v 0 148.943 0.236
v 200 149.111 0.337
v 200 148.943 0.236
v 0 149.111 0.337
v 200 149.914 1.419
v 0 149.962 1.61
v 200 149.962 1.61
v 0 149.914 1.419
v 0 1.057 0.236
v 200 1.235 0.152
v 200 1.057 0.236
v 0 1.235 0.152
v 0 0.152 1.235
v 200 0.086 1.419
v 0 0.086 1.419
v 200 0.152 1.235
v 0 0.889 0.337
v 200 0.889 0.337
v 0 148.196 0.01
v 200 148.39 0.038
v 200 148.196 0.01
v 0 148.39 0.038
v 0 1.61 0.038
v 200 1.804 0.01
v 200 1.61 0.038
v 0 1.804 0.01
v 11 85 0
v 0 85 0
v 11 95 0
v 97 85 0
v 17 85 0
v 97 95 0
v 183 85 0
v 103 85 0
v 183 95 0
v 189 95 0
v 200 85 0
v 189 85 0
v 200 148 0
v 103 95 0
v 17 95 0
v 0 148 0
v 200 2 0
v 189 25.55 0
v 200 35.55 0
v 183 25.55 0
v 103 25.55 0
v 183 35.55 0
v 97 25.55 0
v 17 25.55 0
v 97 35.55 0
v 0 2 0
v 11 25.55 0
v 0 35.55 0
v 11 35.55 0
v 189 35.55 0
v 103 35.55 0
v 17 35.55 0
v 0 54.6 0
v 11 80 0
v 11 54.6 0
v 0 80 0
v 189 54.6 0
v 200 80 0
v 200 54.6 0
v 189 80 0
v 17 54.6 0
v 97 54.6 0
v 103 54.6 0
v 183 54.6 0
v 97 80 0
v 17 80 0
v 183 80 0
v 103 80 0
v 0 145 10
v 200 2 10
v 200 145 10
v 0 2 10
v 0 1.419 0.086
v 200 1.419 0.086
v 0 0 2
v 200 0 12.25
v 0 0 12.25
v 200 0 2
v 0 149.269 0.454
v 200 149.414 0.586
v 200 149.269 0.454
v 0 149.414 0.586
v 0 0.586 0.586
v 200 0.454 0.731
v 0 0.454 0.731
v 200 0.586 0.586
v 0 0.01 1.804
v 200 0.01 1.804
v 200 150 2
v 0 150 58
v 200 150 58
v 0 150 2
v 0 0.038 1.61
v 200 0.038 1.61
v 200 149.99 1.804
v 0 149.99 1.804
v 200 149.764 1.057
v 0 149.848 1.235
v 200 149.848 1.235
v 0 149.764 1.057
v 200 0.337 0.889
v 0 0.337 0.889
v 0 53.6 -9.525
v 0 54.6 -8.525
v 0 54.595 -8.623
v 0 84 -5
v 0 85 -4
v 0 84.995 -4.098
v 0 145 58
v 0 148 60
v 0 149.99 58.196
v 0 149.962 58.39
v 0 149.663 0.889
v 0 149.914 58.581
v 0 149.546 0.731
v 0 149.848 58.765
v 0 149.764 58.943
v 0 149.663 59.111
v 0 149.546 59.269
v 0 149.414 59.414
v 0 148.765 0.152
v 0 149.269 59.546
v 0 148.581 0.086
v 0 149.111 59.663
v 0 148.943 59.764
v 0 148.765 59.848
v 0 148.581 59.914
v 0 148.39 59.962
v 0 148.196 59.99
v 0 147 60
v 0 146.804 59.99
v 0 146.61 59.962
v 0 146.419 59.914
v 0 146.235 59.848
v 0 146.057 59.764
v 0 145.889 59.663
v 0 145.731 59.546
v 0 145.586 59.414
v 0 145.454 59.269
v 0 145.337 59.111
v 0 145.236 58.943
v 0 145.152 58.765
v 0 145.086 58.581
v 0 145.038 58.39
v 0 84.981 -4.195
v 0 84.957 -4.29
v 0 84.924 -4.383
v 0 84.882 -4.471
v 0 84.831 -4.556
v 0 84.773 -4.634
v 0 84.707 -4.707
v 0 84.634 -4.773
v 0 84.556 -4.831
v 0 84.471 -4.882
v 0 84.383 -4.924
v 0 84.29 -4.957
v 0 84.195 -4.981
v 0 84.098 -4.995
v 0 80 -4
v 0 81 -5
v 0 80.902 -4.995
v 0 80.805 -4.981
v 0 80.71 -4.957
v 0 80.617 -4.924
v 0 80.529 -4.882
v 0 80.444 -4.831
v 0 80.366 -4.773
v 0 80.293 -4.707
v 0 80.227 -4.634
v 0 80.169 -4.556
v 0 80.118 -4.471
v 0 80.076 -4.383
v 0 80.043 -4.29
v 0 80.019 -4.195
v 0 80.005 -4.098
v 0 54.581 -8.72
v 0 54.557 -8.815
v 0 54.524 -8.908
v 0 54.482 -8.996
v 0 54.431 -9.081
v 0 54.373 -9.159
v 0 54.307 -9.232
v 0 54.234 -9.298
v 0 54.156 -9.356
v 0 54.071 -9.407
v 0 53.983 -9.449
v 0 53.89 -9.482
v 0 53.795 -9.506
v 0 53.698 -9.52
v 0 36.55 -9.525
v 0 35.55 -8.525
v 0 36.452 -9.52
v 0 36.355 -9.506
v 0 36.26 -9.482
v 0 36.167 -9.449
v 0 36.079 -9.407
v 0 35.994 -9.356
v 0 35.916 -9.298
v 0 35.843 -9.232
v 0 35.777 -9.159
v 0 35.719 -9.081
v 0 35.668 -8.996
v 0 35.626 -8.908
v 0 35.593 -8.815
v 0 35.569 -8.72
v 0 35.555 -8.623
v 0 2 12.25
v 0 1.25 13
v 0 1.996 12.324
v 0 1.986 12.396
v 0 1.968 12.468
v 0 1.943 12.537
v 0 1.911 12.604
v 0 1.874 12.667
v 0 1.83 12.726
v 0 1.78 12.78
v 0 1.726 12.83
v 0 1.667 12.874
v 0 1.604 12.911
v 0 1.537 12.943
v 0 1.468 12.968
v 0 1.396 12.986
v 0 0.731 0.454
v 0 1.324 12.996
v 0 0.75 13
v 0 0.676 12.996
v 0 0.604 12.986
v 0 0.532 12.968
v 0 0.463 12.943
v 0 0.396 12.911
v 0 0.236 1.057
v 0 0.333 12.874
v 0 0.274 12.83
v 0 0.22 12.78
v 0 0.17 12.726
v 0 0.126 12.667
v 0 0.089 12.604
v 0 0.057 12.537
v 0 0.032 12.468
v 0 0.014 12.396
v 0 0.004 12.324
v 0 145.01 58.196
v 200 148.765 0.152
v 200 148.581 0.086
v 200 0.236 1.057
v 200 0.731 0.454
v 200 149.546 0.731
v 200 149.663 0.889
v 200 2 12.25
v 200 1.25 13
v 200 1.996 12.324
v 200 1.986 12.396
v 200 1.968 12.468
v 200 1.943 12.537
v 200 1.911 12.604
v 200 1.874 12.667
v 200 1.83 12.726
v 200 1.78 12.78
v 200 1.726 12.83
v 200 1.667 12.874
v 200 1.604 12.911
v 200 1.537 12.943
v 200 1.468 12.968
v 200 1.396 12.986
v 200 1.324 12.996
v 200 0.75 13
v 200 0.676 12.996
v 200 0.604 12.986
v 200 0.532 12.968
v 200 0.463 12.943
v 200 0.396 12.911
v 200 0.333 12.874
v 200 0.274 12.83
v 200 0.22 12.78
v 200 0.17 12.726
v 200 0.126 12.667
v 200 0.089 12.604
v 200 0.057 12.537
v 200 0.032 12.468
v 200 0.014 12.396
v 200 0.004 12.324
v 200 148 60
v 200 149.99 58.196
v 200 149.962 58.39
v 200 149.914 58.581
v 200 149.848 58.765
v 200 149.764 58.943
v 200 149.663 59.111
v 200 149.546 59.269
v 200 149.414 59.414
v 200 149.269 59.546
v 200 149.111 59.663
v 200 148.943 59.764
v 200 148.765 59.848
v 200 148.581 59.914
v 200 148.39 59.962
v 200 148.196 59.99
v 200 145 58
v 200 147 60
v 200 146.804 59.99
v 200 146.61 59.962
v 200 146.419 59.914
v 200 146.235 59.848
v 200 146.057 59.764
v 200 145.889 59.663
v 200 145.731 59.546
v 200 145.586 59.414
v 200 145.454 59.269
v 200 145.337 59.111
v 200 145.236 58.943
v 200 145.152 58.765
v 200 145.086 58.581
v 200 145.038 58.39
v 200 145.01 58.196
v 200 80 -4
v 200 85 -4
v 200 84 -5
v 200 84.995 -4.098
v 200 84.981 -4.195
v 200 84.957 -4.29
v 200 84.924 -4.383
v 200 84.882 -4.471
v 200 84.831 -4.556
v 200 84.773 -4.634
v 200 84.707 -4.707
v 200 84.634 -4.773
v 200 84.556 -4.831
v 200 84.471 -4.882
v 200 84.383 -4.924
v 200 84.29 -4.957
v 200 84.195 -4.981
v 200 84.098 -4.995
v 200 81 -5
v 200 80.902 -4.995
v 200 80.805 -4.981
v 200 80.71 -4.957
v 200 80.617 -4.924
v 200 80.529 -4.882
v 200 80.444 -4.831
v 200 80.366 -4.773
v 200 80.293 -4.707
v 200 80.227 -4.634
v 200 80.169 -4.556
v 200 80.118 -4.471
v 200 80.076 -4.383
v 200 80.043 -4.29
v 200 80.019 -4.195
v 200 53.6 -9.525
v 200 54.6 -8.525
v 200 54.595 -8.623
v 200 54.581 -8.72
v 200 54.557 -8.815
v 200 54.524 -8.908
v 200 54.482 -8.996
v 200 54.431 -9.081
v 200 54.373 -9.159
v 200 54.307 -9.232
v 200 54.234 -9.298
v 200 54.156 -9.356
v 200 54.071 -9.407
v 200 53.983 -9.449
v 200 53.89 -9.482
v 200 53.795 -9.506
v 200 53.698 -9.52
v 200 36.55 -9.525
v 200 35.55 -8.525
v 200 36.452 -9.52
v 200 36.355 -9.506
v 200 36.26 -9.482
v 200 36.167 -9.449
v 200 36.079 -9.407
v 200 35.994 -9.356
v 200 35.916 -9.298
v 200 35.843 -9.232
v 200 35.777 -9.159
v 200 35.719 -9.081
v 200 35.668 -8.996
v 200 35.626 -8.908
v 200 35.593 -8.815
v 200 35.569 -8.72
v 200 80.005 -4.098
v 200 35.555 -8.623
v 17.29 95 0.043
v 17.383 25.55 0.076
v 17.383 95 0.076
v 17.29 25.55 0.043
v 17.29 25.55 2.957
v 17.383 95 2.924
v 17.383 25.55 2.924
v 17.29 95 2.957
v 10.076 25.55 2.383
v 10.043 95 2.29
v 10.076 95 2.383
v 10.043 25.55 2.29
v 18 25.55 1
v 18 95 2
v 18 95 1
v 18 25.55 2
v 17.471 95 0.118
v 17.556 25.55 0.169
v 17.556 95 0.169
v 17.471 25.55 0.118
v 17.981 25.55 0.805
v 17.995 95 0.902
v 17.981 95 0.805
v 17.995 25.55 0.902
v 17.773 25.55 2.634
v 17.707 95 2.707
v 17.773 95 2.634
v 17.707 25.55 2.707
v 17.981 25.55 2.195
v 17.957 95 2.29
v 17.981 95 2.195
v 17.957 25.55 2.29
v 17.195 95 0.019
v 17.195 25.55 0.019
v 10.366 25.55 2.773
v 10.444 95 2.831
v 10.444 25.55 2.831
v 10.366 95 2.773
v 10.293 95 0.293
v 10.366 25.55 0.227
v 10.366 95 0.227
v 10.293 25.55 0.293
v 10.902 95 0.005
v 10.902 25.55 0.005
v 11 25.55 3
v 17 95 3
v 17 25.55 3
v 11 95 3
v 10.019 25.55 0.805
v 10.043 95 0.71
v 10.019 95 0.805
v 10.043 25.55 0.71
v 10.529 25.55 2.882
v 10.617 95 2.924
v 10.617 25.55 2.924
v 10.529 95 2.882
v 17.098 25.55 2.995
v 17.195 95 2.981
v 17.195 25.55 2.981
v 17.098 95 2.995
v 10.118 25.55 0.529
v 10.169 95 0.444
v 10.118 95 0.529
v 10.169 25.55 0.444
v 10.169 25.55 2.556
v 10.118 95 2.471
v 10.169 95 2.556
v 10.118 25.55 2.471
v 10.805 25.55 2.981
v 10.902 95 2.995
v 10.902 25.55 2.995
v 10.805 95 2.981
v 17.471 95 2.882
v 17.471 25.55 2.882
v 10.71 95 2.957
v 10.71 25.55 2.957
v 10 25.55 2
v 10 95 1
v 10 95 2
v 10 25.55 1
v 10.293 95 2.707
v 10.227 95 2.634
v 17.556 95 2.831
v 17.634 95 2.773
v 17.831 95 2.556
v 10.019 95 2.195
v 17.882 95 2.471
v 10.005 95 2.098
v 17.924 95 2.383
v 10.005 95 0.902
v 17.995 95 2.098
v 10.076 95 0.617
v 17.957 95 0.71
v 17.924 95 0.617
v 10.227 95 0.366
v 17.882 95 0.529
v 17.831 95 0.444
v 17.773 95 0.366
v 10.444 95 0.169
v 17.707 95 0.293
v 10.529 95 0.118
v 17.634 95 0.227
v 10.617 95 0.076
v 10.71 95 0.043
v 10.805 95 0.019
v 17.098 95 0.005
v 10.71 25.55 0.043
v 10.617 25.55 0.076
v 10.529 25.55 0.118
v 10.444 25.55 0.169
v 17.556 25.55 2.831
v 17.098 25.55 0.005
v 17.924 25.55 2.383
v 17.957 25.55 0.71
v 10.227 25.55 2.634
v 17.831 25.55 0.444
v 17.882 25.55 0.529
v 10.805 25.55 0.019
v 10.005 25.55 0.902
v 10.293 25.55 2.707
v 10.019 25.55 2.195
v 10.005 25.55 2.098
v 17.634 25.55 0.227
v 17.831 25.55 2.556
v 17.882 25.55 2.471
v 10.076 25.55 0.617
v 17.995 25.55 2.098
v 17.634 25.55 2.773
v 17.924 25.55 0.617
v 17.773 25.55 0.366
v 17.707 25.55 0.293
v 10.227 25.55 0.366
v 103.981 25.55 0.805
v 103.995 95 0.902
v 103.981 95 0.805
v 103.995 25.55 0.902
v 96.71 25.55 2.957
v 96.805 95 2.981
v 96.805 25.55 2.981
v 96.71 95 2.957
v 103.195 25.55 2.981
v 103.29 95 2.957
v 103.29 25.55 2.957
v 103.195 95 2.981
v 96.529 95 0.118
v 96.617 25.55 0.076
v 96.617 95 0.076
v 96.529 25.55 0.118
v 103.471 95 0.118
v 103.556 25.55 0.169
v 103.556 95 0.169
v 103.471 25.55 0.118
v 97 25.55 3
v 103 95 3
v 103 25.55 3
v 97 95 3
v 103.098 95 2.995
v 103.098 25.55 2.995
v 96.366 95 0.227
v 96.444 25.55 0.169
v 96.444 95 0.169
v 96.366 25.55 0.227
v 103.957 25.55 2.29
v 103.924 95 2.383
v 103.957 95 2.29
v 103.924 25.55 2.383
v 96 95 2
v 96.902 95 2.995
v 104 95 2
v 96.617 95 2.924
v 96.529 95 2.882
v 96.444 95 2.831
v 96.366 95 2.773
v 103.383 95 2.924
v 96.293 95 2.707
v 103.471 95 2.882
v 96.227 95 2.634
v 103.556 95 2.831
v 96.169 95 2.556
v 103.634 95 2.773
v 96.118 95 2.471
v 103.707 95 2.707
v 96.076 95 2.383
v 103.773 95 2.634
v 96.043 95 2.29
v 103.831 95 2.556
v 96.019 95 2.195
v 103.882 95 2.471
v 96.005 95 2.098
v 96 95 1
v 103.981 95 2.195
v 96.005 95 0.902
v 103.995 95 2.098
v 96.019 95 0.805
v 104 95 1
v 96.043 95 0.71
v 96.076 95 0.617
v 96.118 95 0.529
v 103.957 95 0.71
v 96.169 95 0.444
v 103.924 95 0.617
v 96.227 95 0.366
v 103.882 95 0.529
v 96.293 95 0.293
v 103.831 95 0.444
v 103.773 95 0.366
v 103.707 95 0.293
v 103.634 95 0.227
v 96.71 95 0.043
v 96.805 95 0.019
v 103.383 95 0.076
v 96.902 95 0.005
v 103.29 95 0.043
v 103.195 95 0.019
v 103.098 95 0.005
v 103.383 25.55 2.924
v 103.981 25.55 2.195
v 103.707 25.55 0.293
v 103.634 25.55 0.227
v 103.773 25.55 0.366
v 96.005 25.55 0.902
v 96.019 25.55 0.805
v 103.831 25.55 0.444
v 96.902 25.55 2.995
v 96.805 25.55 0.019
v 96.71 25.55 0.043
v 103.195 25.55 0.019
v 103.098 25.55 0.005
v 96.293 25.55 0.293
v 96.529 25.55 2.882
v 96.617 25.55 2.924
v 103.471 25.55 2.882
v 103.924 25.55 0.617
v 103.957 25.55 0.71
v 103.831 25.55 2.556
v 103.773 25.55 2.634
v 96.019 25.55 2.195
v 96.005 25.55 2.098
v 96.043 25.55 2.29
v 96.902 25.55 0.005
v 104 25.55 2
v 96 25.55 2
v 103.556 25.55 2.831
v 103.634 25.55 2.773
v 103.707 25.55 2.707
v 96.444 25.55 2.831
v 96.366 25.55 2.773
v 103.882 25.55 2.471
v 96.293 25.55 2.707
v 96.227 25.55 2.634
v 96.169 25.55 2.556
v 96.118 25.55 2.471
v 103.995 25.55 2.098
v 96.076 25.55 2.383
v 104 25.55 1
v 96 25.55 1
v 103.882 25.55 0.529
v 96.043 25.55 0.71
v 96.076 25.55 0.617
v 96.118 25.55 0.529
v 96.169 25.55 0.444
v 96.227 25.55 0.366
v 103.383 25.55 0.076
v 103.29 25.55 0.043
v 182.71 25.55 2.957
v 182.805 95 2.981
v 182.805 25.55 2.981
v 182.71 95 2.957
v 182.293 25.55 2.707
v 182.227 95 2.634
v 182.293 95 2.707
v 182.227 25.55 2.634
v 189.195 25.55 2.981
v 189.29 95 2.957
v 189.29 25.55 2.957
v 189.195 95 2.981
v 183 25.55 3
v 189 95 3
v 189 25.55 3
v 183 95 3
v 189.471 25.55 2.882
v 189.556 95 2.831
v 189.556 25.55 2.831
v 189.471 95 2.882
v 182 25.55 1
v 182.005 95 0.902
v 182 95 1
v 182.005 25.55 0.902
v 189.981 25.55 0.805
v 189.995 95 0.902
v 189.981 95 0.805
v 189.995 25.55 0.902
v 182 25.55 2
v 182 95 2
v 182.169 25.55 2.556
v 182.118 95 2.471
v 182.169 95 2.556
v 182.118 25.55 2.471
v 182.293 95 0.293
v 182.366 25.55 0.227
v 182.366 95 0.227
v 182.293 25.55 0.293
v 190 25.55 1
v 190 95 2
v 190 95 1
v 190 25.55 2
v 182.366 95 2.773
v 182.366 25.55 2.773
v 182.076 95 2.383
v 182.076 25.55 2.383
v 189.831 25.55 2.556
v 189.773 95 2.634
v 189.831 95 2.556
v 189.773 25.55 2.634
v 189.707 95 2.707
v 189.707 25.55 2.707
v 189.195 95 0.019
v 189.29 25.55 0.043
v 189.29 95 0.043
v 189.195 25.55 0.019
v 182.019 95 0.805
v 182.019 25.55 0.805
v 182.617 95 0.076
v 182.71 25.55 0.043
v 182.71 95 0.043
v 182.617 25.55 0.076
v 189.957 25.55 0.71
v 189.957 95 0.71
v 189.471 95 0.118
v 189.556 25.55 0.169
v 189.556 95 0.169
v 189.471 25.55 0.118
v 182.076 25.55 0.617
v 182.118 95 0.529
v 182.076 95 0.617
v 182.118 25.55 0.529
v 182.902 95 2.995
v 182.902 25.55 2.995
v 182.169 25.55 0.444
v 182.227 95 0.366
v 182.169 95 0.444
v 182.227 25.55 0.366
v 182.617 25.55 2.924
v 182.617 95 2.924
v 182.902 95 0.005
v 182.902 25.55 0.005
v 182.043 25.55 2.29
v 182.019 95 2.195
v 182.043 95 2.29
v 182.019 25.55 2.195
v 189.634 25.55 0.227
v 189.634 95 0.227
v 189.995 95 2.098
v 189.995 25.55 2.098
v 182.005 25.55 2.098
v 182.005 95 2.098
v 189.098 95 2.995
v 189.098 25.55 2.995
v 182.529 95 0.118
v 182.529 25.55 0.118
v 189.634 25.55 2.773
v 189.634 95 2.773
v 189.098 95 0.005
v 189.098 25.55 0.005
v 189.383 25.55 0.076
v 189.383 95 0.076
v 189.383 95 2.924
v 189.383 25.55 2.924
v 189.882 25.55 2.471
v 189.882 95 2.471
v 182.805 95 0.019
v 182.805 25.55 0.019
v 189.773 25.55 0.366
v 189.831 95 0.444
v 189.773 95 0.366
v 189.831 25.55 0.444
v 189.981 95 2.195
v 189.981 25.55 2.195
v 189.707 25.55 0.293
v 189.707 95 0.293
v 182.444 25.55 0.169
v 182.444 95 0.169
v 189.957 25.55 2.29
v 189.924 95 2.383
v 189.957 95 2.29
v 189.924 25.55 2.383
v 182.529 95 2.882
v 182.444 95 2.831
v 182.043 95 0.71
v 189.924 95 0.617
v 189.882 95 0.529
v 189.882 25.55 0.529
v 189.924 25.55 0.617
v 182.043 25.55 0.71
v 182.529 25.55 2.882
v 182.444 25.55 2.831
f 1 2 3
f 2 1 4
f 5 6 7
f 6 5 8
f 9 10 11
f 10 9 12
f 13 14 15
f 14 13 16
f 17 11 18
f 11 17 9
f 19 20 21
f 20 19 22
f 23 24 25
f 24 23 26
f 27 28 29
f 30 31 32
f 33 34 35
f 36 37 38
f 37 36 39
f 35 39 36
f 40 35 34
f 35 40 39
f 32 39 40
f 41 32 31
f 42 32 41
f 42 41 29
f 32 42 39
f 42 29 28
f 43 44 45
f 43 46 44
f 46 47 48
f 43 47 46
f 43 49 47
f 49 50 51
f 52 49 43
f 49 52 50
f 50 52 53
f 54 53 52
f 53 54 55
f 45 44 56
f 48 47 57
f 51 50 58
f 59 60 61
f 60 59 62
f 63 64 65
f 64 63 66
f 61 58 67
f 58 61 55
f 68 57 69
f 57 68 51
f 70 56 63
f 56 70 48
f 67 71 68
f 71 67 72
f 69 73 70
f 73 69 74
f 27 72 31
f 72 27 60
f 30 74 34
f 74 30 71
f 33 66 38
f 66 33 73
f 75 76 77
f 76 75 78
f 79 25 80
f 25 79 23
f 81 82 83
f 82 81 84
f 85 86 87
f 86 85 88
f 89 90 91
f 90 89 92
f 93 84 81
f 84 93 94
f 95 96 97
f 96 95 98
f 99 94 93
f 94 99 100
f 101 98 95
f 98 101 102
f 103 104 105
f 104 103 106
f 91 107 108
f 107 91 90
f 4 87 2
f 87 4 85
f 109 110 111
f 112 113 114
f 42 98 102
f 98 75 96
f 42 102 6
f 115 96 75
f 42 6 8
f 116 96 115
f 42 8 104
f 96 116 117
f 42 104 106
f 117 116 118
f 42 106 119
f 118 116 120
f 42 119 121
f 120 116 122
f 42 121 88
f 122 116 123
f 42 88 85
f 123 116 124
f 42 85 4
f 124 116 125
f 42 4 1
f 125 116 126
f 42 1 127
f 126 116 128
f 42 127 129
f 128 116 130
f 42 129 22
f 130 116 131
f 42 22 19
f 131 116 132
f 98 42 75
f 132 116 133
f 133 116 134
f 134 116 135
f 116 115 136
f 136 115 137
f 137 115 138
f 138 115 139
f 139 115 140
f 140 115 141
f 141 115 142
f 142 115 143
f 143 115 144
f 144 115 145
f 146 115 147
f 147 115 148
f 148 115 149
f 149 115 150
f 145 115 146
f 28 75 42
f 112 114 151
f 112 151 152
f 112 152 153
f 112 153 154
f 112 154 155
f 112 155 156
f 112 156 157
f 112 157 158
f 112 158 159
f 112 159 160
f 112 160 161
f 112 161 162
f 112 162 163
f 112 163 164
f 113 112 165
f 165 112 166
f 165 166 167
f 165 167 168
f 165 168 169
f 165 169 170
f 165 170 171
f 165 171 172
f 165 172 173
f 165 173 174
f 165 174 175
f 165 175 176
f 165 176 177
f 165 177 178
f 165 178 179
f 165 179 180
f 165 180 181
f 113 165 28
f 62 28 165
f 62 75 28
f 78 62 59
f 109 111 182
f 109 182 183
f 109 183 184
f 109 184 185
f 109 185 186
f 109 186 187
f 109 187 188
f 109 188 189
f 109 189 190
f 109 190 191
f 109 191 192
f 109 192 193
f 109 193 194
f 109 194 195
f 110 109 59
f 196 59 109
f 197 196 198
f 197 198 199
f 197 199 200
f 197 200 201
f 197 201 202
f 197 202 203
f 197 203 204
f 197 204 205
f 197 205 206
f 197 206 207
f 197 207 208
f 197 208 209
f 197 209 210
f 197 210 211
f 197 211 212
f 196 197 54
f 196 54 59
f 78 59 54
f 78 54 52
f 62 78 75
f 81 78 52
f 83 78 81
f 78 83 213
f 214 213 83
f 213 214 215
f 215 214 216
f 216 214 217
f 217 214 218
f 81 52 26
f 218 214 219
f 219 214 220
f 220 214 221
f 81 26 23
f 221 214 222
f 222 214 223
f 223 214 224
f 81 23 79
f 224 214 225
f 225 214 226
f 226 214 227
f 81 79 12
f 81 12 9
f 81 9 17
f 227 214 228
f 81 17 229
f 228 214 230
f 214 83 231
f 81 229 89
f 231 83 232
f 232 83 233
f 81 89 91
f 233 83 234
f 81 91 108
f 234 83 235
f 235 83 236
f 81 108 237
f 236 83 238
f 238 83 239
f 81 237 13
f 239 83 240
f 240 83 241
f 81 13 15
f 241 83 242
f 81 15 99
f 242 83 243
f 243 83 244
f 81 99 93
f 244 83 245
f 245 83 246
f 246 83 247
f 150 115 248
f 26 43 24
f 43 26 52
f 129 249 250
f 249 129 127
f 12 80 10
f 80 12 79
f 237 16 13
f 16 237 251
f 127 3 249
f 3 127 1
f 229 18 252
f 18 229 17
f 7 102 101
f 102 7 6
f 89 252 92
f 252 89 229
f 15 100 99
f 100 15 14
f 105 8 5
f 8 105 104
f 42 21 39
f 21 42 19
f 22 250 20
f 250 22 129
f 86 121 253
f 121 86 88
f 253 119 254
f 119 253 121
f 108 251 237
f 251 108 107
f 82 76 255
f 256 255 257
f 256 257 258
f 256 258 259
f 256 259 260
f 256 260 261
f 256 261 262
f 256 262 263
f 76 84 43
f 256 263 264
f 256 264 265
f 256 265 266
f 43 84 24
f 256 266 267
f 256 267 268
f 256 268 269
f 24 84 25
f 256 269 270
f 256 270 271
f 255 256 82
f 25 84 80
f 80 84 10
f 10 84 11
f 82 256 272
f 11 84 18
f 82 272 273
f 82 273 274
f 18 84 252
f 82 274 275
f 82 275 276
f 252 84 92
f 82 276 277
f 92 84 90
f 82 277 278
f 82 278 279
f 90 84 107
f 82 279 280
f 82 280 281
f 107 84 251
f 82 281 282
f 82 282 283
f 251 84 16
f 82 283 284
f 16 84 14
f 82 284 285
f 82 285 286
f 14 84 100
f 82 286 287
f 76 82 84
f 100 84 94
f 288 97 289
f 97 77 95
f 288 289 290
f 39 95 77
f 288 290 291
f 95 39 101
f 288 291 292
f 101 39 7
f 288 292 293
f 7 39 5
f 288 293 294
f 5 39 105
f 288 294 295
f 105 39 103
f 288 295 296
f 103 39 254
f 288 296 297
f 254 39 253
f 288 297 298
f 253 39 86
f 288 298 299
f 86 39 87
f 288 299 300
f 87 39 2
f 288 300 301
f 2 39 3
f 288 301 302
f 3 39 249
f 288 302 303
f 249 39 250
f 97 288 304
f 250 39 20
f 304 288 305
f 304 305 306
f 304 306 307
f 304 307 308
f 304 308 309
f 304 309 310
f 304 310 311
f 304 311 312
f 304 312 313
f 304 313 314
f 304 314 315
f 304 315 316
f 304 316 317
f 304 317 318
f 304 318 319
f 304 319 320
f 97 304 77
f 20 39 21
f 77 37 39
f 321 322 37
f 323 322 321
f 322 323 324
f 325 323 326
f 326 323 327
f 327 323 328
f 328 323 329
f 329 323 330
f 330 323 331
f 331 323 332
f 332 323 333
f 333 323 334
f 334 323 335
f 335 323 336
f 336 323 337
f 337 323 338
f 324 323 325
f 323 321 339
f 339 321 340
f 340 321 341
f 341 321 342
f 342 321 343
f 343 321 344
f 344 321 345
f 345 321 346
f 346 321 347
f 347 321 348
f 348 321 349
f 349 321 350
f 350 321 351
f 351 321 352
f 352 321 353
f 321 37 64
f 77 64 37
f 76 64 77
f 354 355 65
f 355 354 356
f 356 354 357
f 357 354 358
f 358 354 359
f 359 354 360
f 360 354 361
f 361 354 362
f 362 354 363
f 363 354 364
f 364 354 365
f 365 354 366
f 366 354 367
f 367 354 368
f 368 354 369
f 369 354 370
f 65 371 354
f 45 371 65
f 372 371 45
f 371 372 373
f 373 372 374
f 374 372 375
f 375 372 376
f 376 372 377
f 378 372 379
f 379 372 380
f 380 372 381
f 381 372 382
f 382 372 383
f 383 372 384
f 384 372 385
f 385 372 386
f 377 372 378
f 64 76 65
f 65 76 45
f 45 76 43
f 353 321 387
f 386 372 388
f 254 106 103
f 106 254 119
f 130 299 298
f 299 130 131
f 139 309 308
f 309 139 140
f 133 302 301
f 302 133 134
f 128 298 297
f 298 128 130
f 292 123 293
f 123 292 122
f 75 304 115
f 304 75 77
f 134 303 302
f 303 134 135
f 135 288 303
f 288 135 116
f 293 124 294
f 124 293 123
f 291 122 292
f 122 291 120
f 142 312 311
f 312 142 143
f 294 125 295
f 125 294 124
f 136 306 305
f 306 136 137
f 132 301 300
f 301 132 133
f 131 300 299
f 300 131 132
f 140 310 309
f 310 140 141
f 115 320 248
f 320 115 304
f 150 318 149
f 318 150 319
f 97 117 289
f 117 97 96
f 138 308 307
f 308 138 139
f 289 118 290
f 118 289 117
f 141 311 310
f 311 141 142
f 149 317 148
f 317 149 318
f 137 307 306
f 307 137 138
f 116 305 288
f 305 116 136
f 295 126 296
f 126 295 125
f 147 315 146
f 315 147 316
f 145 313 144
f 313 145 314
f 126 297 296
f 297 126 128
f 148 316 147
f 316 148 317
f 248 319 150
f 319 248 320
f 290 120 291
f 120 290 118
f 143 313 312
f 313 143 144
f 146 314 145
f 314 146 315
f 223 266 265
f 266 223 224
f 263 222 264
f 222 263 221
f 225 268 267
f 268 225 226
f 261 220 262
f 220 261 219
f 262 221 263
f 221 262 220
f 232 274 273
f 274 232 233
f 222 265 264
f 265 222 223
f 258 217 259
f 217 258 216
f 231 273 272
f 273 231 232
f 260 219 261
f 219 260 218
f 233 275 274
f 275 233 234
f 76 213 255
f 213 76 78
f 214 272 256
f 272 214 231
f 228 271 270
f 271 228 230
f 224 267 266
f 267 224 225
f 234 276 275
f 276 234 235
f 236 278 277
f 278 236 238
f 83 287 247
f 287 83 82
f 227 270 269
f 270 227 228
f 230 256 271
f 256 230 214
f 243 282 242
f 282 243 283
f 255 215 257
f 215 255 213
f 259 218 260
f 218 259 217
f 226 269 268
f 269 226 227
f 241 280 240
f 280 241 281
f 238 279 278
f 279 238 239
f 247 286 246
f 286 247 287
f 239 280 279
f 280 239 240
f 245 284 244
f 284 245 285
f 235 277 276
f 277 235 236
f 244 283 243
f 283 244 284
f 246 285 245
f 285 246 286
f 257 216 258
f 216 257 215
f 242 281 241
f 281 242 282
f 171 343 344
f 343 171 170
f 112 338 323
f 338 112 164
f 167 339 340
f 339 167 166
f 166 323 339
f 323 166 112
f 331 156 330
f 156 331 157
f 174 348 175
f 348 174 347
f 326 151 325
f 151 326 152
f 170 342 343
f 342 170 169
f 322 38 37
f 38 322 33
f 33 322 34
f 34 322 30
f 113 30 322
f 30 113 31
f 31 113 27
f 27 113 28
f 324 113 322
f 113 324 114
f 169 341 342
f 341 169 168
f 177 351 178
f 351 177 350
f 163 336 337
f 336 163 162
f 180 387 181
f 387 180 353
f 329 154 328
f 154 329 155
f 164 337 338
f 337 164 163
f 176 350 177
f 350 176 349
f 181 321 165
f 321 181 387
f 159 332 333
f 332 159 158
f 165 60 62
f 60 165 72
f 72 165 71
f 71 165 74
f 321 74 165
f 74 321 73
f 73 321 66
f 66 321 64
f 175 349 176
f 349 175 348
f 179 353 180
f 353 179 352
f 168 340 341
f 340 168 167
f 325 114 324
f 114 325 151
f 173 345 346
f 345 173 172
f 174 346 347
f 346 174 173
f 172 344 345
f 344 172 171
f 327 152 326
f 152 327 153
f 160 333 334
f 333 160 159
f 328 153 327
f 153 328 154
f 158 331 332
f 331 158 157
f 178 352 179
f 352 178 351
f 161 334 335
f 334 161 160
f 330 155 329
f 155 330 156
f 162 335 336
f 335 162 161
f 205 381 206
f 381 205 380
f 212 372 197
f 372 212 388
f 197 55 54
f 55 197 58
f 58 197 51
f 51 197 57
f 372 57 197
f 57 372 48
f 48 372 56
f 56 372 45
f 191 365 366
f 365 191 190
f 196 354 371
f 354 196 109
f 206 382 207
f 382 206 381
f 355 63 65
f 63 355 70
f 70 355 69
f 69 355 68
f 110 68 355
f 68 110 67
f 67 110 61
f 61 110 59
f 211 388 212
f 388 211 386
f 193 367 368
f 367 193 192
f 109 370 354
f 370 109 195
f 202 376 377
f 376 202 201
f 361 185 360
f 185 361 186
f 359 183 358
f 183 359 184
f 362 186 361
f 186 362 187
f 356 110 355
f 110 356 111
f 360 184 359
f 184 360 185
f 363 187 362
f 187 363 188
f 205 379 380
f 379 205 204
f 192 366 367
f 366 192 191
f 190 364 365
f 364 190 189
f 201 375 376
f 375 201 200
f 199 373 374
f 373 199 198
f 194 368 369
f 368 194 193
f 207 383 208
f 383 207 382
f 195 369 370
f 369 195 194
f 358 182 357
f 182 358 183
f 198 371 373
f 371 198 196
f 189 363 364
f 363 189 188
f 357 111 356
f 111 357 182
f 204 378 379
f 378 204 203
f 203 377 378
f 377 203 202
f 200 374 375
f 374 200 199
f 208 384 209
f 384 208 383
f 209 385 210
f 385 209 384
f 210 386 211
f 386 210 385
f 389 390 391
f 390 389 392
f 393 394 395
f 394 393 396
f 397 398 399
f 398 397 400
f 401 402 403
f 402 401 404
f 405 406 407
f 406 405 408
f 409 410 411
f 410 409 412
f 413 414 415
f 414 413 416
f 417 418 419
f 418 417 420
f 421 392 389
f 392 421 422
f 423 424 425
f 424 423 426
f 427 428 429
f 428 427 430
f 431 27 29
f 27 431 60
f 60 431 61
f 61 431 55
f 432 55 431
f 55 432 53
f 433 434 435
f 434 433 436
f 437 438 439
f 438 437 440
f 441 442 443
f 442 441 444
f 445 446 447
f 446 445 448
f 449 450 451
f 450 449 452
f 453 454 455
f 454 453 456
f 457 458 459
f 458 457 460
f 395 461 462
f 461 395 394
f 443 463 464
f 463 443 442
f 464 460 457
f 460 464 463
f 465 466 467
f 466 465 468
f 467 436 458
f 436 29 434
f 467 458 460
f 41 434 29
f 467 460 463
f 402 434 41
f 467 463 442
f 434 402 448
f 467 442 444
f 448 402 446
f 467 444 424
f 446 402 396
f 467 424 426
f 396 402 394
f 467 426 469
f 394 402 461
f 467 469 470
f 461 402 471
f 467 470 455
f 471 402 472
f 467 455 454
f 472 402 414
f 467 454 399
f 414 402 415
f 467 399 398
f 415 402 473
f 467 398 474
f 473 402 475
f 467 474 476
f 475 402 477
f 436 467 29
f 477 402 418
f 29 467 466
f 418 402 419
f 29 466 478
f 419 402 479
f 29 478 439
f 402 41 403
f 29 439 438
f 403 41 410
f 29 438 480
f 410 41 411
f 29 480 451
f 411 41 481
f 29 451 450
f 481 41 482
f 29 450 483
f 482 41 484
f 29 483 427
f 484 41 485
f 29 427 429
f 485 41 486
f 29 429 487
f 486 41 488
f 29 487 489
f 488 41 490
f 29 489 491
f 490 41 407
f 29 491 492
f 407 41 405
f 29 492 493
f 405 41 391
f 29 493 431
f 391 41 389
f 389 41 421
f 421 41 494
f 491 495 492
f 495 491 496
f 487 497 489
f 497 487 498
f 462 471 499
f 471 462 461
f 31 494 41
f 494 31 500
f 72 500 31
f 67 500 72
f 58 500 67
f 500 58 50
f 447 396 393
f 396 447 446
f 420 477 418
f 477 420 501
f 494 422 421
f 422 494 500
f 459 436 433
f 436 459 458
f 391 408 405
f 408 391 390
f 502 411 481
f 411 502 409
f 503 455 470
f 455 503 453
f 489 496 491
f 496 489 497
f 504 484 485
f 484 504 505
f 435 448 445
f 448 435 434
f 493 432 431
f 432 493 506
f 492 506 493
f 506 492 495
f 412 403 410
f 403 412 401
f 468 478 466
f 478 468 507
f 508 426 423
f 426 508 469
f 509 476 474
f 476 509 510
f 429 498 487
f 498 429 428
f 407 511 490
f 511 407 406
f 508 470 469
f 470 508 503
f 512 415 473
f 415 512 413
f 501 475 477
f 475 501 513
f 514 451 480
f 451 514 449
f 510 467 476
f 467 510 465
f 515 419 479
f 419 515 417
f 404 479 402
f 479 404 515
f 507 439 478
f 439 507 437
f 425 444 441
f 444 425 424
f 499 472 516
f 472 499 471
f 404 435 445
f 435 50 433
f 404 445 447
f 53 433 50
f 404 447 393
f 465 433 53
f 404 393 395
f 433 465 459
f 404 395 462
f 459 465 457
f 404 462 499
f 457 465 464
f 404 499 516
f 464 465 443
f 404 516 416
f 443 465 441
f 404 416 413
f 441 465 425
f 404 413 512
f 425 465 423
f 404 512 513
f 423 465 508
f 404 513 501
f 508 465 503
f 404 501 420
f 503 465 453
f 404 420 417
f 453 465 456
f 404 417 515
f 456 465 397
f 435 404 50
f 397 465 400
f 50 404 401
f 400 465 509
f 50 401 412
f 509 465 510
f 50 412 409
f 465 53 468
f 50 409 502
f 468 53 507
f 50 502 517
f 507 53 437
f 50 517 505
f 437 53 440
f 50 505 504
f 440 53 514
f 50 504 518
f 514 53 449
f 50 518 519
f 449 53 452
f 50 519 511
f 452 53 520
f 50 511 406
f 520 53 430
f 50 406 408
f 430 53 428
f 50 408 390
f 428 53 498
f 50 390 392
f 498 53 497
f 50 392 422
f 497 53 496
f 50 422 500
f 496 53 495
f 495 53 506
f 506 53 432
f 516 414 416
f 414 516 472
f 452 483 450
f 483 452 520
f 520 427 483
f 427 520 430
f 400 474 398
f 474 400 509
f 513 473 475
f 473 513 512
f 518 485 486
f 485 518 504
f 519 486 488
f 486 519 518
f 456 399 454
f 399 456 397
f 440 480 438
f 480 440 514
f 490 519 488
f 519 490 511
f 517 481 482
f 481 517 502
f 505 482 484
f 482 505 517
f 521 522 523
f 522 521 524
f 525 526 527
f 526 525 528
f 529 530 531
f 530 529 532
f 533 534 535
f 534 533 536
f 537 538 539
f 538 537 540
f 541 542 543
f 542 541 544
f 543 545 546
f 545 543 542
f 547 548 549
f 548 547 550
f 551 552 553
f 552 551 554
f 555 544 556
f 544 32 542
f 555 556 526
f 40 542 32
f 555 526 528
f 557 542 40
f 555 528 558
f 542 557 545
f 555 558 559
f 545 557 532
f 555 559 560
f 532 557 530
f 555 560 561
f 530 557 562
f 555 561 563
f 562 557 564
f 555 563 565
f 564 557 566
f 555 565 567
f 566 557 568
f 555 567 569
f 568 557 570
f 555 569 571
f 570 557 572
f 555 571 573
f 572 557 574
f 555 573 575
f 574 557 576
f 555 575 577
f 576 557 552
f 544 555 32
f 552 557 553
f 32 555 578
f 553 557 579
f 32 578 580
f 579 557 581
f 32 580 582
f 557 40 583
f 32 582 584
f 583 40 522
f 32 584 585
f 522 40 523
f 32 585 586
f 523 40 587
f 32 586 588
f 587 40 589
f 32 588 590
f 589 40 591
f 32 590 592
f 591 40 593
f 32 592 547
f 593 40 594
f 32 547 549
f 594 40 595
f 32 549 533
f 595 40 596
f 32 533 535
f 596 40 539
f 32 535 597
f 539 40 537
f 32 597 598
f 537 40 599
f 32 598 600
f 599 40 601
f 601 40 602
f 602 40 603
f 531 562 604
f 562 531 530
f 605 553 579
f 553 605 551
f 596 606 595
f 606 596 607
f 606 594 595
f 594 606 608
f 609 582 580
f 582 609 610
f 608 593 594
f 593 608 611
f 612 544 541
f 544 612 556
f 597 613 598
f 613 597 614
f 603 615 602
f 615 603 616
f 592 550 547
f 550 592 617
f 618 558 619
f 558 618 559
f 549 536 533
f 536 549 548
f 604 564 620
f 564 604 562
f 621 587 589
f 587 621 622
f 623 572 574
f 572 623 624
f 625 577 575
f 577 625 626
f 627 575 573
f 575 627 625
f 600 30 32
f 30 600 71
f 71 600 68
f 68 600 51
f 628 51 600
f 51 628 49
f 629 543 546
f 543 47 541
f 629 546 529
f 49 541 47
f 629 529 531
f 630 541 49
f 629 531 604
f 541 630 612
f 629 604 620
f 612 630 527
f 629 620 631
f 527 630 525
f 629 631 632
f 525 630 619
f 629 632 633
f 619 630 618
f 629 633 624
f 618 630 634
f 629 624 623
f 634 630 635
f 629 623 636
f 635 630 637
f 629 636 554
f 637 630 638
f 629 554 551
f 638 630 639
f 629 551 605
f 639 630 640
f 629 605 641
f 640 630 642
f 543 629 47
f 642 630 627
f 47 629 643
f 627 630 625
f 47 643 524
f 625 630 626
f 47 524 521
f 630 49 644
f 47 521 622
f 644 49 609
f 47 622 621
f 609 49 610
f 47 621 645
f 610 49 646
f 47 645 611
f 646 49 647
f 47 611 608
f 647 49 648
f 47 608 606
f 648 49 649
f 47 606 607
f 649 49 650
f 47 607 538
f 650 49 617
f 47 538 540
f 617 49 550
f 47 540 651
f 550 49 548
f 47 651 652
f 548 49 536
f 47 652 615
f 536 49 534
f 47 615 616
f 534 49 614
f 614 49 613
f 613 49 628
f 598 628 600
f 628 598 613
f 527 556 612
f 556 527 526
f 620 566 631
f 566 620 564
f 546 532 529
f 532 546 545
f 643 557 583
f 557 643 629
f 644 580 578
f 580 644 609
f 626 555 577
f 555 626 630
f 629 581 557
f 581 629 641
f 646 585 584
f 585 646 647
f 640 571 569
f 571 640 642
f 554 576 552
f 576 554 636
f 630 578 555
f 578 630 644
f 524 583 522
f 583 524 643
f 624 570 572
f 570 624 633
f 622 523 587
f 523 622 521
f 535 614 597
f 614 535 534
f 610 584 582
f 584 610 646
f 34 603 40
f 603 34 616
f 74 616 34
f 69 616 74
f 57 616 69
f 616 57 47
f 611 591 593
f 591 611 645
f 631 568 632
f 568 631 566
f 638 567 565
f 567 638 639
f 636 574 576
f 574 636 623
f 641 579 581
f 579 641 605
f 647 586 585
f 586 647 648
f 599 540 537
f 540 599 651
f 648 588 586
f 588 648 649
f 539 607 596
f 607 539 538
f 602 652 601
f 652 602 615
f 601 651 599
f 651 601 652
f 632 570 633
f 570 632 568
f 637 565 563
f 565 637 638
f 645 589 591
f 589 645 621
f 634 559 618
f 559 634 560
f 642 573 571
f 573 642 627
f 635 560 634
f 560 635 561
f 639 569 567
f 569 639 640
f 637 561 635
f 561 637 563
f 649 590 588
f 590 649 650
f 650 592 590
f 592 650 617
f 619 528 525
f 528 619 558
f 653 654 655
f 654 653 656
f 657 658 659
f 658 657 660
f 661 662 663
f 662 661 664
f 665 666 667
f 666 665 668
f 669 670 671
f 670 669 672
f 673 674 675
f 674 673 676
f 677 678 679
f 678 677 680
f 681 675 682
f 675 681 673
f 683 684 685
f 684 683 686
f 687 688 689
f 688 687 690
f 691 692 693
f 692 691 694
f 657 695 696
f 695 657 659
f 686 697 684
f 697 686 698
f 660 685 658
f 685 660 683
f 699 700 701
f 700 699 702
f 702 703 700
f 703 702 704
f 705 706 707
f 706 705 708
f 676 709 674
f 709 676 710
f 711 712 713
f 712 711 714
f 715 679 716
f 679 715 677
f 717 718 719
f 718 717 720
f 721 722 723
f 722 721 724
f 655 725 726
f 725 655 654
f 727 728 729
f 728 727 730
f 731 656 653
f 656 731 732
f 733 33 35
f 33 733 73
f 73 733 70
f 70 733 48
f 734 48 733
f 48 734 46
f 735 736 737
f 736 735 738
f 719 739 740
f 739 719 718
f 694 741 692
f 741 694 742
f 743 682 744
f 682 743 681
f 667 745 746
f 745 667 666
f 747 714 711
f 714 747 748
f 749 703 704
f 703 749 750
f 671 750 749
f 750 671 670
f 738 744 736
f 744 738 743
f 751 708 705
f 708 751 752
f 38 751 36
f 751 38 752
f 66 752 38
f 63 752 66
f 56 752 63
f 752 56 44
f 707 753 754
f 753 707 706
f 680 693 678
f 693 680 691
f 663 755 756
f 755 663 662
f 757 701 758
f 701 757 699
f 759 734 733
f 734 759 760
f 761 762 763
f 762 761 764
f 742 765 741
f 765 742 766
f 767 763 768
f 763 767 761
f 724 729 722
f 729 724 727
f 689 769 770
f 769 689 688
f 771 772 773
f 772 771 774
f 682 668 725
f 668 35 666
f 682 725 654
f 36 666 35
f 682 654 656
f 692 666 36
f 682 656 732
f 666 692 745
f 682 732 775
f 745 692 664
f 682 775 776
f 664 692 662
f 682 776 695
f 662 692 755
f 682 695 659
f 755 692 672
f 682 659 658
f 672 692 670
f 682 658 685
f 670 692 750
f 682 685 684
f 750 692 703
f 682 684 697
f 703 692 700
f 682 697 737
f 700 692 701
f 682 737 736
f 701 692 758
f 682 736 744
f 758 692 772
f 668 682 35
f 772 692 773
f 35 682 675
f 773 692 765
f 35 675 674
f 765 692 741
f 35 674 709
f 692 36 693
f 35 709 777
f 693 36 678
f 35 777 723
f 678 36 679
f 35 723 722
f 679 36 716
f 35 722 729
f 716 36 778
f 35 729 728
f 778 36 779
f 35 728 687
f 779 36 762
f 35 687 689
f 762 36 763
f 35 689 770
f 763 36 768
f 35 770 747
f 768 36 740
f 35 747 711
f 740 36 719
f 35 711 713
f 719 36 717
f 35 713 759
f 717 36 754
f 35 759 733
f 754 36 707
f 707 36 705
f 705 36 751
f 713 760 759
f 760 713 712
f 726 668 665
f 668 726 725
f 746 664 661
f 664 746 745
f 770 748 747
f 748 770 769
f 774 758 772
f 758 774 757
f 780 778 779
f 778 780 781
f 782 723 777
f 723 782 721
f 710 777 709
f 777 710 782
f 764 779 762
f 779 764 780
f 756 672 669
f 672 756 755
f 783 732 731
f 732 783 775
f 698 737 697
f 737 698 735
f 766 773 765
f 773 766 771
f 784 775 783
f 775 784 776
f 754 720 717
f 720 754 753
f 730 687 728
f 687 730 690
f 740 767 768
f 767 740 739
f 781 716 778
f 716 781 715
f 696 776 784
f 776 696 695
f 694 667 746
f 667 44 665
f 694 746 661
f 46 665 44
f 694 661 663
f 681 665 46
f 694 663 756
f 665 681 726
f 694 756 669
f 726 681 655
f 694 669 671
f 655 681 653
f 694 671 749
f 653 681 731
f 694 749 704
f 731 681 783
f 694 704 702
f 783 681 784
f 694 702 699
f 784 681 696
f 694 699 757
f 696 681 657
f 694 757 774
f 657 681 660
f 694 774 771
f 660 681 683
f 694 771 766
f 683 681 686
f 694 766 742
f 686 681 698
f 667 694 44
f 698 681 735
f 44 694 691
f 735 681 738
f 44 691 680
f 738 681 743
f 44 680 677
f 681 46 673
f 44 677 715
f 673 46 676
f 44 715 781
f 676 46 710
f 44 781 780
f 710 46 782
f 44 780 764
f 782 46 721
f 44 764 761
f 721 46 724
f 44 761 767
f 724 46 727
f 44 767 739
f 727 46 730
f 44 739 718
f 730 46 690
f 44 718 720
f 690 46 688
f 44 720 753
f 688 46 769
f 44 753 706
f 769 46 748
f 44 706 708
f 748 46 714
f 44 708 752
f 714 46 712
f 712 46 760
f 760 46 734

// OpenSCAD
// file: 72-inch-cosco-profile.scad
// 72-inch Cosco shelf profile.
//
// Overrides the bar / front-lip dimensions in bar_shelf.scad to fit a
// 72-inch Cosco shelving rail. Include this BEFORE bar_shelf.scad in any
// wrapper that should use the Cosco profile.
border_ridge_override     = 25.4;    // 1"
border_depth_override     = 19.05;   // 3/4"
border_height_override    = 9.525;   // 3/8"
rear_wall_height_override = 5;       // shorter rear lip than 77-inch industrial
// main file
// 200mm-wide 72-inch Cosco shelf — see bar_shelf.scad for the design.
include <72-inch-cosco-profile.scad>
shelf_width_override = 200;
include <bar_shelf.scad>
